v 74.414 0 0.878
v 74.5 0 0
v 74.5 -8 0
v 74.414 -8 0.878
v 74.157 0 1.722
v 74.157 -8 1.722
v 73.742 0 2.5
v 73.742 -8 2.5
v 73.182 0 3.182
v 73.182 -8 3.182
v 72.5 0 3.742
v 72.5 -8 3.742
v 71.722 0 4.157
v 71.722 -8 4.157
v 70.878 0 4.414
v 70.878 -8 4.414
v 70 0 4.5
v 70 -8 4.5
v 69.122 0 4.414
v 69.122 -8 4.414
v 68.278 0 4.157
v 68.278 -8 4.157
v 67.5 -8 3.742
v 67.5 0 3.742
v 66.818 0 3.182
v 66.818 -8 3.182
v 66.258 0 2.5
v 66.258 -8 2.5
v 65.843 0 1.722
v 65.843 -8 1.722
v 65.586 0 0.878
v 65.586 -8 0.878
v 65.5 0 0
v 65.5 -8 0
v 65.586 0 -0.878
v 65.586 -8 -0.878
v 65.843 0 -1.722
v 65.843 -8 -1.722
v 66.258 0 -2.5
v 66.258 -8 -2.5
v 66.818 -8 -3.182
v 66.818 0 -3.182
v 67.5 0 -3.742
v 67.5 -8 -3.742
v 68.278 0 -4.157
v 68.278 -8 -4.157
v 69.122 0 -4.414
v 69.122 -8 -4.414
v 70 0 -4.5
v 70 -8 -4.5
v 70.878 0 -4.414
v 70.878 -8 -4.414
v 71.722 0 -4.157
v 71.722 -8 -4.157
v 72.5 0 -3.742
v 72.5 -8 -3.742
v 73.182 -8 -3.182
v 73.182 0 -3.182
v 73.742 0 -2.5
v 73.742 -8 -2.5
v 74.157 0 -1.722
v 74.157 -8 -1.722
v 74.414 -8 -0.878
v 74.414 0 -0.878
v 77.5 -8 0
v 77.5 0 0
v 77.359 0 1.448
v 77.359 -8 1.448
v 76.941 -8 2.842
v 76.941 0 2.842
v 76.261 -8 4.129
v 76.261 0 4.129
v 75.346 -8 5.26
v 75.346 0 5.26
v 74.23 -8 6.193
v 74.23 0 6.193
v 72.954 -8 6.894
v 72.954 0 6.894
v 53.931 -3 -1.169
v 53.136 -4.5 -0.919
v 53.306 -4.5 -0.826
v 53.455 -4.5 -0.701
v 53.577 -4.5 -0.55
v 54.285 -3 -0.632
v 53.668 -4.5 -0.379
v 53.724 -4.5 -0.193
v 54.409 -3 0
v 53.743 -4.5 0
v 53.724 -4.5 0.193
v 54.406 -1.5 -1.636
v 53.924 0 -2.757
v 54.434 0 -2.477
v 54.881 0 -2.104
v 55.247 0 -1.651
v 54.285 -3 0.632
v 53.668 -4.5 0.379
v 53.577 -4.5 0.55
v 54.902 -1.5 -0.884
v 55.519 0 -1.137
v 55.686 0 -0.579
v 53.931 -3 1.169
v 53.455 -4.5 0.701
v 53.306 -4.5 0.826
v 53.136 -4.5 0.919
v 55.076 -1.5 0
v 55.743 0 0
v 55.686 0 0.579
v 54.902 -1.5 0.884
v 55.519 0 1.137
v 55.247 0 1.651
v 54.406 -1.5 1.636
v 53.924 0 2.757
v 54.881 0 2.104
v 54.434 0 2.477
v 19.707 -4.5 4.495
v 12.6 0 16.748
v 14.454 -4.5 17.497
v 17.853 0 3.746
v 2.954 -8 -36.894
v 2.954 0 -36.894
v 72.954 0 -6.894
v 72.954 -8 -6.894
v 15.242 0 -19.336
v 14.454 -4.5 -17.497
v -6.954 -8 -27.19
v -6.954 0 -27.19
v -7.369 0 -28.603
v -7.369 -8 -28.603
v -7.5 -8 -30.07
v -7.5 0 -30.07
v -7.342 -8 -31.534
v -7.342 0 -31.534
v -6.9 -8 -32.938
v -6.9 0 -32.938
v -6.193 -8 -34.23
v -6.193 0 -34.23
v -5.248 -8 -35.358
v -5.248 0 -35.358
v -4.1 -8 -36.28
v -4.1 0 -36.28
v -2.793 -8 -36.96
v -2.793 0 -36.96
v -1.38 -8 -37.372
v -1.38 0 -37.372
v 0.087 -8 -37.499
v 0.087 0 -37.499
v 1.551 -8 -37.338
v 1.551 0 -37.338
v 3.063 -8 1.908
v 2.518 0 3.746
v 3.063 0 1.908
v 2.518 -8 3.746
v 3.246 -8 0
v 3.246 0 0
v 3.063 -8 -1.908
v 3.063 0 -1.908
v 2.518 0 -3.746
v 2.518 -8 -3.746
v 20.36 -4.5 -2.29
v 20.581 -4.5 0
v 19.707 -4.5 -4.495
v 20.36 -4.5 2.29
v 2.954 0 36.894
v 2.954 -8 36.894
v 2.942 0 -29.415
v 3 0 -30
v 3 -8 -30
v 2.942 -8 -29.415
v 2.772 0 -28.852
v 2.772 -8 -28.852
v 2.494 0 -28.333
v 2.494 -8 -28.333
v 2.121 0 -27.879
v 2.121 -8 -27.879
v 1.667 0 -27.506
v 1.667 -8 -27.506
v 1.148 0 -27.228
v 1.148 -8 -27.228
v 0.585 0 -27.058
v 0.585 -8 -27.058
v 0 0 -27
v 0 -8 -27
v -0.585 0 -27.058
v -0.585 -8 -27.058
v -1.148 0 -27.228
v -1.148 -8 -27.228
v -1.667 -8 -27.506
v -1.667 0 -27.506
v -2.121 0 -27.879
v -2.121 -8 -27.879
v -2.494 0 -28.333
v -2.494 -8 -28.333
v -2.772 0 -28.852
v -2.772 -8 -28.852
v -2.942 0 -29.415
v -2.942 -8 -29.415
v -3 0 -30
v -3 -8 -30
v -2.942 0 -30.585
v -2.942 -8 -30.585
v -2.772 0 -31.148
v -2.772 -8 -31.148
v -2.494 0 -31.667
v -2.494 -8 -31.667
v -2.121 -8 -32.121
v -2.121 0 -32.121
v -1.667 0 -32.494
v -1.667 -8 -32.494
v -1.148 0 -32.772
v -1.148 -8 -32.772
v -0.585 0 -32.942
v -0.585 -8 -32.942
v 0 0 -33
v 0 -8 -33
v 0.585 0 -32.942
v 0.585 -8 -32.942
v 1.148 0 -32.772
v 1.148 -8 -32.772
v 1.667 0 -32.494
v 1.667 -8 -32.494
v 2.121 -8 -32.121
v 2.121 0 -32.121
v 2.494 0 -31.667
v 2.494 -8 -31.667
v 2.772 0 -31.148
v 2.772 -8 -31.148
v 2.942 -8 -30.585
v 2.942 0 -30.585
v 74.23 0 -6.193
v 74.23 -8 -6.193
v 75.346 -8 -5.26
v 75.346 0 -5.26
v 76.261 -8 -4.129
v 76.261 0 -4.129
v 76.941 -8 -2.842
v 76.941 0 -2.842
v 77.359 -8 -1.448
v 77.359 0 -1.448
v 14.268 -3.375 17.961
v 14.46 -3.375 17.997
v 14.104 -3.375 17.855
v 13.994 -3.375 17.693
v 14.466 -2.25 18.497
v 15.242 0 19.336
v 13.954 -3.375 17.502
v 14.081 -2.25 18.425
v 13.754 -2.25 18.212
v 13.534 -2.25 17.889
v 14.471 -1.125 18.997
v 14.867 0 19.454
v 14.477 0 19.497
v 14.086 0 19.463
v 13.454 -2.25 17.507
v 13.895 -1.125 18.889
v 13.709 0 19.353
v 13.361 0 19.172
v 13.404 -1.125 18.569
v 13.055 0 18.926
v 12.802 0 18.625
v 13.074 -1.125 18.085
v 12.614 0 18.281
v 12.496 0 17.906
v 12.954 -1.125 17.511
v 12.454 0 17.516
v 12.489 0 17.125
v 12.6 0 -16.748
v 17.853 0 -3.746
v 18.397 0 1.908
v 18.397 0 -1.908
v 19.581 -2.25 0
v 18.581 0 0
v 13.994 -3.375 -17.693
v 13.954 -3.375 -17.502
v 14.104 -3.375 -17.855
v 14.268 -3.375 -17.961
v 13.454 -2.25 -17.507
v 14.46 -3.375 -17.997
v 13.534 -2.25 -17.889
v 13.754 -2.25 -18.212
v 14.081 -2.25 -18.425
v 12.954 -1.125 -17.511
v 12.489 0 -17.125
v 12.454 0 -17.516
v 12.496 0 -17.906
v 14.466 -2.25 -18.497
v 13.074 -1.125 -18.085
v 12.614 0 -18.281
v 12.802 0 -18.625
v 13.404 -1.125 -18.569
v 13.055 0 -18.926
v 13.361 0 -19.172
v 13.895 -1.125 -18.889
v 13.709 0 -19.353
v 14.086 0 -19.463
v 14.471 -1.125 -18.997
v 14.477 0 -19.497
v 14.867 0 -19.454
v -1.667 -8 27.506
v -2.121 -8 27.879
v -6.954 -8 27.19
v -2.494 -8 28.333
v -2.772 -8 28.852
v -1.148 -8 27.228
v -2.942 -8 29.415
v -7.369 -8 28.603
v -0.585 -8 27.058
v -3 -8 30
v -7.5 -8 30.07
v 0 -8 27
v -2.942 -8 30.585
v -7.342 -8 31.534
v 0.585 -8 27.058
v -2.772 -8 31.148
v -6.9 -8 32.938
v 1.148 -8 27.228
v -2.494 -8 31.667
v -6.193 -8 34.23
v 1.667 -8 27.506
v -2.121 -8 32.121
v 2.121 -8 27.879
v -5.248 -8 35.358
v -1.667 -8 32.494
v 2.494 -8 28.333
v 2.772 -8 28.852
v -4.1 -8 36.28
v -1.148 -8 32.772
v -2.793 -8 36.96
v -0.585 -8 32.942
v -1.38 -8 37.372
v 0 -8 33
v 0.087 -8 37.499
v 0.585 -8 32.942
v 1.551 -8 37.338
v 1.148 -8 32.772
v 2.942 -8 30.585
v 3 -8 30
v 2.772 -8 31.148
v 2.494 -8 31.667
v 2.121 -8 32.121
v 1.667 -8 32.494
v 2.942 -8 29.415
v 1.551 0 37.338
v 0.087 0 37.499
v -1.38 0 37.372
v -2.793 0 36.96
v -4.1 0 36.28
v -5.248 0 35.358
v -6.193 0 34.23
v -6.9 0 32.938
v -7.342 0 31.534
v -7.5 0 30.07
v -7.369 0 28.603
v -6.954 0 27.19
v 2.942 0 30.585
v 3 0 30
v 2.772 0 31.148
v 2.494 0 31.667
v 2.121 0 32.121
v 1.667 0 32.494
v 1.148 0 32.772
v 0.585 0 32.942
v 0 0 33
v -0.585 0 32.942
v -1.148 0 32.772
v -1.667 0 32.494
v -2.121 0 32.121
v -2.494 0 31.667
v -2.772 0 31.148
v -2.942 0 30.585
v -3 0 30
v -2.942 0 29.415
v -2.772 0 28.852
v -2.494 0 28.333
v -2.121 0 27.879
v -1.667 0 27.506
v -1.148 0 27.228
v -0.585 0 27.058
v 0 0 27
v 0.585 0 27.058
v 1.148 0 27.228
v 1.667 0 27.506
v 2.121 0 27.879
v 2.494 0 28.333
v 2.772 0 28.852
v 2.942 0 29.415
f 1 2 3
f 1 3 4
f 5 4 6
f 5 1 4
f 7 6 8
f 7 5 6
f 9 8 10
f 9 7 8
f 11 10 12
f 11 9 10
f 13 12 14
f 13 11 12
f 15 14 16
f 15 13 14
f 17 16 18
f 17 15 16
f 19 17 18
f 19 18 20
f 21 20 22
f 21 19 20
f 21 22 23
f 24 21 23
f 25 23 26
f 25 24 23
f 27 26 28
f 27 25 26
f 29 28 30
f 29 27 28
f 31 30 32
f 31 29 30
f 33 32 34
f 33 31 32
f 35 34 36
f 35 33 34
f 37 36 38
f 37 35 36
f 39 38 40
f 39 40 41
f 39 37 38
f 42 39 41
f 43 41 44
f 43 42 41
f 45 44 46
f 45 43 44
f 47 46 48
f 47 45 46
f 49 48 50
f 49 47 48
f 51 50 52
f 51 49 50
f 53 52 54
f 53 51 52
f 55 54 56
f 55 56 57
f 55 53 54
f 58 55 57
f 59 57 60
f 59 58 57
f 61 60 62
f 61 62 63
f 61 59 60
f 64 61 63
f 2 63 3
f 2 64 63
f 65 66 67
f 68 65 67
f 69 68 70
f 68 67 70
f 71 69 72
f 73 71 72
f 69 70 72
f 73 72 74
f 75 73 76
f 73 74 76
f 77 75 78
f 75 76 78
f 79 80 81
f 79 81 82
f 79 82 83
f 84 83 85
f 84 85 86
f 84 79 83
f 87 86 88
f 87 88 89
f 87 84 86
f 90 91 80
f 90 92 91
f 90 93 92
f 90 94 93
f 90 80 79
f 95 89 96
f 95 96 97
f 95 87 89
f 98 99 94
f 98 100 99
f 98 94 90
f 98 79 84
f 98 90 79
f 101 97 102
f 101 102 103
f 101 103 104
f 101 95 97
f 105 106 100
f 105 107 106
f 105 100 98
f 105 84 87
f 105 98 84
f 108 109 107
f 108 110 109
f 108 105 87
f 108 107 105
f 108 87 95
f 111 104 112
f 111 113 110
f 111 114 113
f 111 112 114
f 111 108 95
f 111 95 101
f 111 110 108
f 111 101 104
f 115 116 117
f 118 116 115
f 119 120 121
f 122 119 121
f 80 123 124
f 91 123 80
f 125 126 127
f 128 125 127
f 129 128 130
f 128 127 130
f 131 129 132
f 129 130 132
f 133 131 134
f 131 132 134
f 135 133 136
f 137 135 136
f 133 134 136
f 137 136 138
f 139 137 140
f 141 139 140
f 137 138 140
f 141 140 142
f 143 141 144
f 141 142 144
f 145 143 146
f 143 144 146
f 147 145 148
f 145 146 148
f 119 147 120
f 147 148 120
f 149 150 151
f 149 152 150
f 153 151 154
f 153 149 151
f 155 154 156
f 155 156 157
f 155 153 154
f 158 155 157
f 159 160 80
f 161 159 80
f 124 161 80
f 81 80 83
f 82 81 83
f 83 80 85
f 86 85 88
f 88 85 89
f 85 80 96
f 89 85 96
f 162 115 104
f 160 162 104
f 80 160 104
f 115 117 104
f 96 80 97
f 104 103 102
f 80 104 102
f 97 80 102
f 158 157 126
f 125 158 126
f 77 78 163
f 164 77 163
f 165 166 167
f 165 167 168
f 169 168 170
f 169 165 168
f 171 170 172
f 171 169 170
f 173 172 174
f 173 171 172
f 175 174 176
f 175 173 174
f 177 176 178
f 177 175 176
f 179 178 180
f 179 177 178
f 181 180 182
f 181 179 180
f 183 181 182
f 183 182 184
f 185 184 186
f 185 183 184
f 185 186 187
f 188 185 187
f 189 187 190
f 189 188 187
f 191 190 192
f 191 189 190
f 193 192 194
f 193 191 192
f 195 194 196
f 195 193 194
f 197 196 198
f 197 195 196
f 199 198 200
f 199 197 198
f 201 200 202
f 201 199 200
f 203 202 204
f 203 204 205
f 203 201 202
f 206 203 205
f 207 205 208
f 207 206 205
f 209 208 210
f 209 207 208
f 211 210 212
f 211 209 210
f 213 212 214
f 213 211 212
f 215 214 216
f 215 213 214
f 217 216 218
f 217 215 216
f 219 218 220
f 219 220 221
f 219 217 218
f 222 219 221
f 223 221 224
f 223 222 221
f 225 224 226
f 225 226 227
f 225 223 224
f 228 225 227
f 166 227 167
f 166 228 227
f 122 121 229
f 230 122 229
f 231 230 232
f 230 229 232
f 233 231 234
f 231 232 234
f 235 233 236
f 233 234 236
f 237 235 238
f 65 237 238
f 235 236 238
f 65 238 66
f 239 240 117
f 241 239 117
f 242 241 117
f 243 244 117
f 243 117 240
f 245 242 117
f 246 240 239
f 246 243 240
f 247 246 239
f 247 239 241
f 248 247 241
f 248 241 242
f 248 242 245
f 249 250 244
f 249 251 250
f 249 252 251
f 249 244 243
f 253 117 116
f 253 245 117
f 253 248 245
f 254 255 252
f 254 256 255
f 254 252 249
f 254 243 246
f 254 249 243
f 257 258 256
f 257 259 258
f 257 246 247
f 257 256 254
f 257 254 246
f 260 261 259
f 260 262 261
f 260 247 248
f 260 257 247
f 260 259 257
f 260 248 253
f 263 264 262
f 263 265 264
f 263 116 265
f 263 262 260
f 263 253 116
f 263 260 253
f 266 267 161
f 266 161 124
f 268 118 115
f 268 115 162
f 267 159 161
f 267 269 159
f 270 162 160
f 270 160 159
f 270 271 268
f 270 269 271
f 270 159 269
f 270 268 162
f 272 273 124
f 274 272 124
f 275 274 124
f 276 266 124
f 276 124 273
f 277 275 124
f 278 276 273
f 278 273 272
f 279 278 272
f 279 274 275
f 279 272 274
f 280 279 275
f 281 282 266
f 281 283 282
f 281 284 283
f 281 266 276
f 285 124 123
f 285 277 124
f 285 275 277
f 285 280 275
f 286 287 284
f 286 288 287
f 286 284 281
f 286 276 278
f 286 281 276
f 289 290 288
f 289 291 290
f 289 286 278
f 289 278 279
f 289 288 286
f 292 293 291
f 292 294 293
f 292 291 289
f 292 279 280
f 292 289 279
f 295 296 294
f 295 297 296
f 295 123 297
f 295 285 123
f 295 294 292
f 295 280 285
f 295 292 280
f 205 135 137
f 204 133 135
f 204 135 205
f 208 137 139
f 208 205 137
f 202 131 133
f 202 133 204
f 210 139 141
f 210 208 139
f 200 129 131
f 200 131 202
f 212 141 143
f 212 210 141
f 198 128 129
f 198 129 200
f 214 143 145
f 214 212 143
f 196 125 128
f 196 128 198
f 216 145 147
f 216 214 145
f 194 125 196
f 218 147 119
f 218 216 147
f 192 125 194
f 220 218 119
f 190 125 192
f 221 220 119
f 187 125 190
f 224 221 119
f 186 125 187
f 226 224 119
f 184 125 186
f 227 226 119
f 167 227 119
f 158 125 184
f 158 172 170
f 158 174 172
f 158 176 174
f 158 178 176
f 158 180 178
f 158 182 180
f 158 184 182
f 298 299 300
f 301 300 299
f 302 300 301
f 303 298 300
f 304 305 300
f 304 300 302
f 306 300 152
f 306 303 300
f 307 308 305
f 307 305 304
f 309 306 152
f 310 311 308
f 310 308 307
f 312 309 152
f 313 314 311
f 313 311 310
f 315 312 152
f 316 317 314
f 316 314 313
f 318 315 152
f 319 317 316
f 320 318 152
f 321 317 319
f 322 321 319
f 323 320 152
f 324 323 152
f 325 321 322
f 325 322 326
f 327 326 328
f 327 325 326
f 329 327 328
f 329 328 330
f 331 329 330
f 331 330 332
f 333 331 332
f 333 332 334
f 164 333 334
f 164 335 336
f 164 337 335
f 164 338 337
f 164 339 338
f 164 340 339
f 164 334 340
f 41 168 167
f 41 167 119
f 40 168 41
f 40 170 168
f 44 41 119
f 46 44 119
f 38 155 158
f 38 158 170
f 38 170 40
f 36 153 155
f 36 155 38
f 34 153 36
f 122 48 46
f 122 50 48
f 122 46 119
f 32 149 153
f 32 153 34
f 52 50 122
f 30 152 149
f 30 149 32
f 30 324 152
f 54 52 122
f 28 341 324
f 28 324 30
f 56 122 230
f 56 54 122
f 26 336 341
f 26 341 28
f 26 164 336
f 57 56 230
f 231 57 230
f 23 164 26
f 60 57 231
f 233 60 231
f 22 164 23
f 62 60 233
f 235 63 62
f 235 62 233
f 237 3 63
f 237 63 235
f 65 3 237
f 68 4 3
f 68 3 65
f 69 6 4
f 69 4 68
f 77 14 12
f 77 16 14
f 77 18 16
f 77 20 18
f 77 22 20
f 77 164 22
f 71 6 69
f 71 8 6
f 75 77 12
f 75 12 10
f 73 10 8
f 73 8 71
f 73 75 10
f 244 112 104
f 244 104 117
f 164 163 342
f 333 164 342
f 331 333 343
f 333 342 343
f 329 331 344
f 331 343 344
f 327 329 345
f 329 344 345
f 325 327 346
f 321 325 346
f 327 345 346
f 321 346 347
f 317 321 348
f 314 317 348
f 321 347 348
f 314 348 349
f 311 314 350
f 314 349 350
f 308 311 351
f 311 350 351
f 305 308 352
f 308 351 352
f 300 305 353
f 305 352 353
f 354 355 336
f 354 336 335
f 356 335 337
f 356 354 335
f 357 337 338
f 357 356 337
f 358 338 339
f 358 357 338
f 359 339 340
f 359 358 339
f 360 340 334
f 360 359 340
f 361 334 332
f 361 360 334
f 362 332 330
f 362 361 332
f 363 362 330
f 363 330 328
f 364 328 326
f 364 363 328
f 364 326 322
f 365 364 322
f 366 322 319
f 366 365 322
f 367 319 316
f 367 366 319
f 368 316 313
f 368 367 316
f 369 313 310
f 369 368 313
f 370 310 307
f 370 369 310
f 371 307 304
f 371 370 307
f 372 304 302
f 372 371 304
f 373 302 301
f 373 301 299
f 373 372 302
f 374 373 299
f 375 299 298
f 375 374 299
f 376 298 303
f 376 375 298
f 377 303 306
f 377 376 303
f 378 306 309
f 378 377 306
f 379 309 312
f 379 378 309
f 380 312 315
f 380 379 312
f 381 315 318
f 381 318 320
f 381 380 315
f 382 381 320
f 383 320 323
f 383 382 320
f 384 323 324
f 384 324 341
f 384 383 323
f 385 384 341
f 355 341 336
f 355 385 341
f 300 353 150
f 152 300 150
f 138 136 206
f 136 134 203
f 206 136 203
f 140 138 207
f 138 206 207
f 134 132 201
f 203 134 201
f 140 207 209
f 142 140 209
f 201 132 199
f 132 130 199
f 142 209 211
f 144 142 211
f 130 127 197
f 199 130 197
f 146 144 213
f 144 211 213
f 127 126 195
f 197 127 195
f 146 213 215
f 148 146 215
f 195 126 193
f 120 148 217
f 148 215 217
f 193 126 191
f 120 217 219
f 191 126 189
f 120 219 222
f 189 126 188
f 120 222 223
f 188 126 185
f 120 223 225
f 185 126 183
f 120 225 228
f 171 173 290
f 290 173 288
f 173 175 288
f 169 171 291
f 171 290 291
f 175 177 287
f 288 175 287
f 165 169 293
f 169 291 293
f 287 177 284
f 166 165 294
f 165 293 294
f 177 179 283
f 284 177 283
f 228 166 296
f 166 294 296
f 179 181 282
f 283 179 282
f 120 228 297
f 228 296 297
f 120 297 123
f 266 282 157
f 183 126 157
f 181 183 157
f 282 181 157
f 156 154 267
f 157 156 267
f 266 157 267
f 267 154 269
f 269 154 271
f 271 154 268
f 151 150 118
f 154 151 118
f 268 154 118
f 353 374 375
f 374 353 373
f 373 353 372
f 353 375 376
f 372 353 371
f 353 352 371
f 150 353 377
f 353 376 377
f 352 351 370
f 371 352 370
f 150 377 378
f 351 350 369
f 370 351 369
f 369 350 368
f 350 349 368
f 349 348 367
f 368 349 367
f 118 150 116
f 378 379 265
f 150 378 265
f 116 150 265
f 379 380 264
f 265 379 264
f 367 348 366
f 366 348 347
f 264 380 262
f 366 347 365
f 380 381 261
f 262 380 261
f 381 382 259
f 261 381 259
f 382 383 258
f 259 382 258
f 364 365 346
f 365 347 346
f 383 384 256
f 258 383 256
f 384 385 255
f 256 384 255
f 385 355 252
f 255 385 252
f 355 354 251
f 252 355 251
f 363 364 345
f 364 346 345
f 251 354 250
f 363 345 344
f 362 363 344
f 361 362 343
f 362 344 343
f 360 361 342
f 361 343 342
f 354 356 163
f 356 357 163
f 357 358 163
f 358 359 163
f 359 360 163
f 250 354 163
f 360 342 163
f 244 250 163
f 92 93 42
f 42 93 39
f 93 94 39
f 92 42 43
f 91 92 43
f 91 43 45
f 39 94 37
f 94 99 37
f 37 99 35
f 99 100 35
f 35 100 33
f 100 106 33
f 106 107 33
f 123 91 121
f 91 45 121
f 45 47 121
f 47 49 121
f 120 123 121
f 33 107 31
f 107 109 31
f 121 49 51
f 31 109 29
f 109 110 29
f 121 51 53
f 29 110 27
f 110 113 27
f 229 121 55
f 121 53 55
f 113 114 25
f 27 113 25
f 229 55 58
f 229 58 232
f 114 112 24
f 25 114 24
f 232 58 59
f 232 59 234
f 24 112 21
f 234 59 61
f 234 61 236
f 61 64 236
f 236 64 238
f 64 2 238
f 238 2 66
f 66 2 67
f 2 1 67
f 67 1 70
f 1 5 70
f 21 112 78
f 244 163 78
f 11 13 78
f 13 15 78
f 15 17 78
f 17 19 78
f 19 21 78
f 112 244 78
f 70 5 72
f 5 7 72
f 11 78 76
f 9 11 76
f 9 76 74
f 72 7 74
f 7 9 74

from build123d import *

# Parameters (mm, degrees)
F0_R     = 3
F0_R_2   = 4.5
F1_DEPTH = 8
F2_R     = 10
F4_DEPTH = 4.5
F5_SIZE2 = 4.49999
F5_SIZE  = 1.99999


# Not quite as in the source:
# - a fillet or chamfer is up to 0.001 mm smaller than in the source, because OpenCascade refuses the exact size


with BuildPart() as f1:
    # F0 (on Front) → F1 (new body)
    with BuildSketch(Plane.XZ):
        with BuildLine():
            ThreePointArc((-6.9538789093, 27.1904505494), (1.4310674653, 22.6377961241), (7.5, 30))
            ThreePointArc((7.5, 30), (6.2613081918, 34.1286825656), (2.9543947393, 36.8935877251))
            ThreePointArc((2.9543947393, 36.8935877251), (-5.247540964, 35.3584805524), (-6.9538789093, 27.1904505494))
        make_face()
        with Locations((0, 30)):
            Circle(F0_R, mode=Mode.SUBTRACT)
        with BuildLine():
            ThreePointArc((2.9543947393, 36.8935877251), (6.2613081918, 34.1286825656), (7.5, 30))
            ThreePointArc((7.5, 30), (1.4310674653, 22.6377961241), (-6.9538789093, 27.1904505494))
            Line((-6.9538789093, 27.1904505494), (4.031776205, 0))
            Line((4.031776205, 0), (-6.9538789093, -27.1904505494))
            ThreePointArc((-6.9538789093, -27.1904505494), (1.4310674653, -22.6377961241), (7.5, -30))
            ThreePointArc((7.5, -30), (6.2613081918, -34.1286825656), (2.9543947393, -36.8935877251))
            Line((2.9543947393, -36.8935877251), (72.9543947393, -6.8935877251))
            ThreePointArc((72.9543947393, -6.8935877251), (62.5, 0), (72.9543947393, 6.8935877251))
            Line((72.9543947393, 6.8935877251), (2.9543947393, 36.8935877251))
        make_face()
        with BuildLine():
            ThreePointArc((77.5, 0), (76.2613081918, 4.1286825656), (72.9543947393, 6.8935877251))
            ThreePointArc((72.9543947393, 6.8935877251), (62.5, 0), (72.9543947393, -6.8935877251))
            ThreePointArc((72.9543947393, -6.8935877251), (76.2613081918, -4.1286825656), (77.5, 0))
        make_face()
        with Locations((70, 0)):
            Circle(F0_R_2, mode=Mode.SUBTRACT)
        with BuildLine():
            ThreePointArc((7.5, -30), (1.4310674653, -22.6377961241), (-6.9538789093, -27.1904505494))
            ThreePointArc((-6.9538789093, -27.1904505494), (-5.247540964, -35.3584805524), (2.9543947393, -36.8935877251))
            ThreePointArc((2.9543947393, -36.8935877251), (6.2613081918, -34.1286825656), (7.5, -30))
        make_face()
        with Locations((0, -30)):
            Circle(F0_R, mode=Mode.SUBTRACT)
    extrude(amount=F1_DEPTH)

    # F2
    f2_edges = [f1.edges().sort_by_distance(p)[0] for p in [
        (4.031776, -4, 0),
    ]]
    fillet(f2_edges, radius=F2_R)

    # F3 (on Front) → F4 (cut)
    with BuildSketch(Plane.XZ):
        with BuildLine():
            Line((12.5995942419, 16.7481284808), (17.8527685007, 3.7460659342))
            ThreePointArc((17.8527685007, 3.7460659342), (18.580929955, 0), (17.8527685007, -3.7460659342))
            Line((17.8527685007, -3.7460659342), (12.5995942419, -16.7481284808))
            ThreePointArc((12.5995942419, -16.7481284808), (13.0546176939, -18.926269815), (15.2418005482, -19.3356317277))
            Line((15.2418005482, -19.3356317277), (53.9242593693, -2.7574350901))
            ThreePointArc((53.9242593693, -2.7574350901), (55.7425014736, 0), (53.9242593693, 2.7574350901))
            Line((53.9242593693, 2.7574350901), (15.2418005482, 19.3356317277))
            ThreePointArc((15.2418005482, 19.3356317277), (13.0546176939, 18.926269815), (12.5995942419, 16.7481284808))
        make_face()
    extrude(amount=F4_DEPTH, mode=Mode.SUBTRACT)

    # F5 (size 2 and 4.5 in the source; OpenCascade refuses exactly that, so slightly less here)
    f5_edges = [f1.edges().sort_by_distance(p)[0] for p in [
        (34.58303, -4.5, 11.046533),
    ]]
    f5_side = f1.faces().sort_by_distance((30.018515, -4.5, 0))[0]
    chamfer(f5_edges, length=F5_SIZE, length2=F5_SIZE2, reference=f5_side)


solid = f1.part
